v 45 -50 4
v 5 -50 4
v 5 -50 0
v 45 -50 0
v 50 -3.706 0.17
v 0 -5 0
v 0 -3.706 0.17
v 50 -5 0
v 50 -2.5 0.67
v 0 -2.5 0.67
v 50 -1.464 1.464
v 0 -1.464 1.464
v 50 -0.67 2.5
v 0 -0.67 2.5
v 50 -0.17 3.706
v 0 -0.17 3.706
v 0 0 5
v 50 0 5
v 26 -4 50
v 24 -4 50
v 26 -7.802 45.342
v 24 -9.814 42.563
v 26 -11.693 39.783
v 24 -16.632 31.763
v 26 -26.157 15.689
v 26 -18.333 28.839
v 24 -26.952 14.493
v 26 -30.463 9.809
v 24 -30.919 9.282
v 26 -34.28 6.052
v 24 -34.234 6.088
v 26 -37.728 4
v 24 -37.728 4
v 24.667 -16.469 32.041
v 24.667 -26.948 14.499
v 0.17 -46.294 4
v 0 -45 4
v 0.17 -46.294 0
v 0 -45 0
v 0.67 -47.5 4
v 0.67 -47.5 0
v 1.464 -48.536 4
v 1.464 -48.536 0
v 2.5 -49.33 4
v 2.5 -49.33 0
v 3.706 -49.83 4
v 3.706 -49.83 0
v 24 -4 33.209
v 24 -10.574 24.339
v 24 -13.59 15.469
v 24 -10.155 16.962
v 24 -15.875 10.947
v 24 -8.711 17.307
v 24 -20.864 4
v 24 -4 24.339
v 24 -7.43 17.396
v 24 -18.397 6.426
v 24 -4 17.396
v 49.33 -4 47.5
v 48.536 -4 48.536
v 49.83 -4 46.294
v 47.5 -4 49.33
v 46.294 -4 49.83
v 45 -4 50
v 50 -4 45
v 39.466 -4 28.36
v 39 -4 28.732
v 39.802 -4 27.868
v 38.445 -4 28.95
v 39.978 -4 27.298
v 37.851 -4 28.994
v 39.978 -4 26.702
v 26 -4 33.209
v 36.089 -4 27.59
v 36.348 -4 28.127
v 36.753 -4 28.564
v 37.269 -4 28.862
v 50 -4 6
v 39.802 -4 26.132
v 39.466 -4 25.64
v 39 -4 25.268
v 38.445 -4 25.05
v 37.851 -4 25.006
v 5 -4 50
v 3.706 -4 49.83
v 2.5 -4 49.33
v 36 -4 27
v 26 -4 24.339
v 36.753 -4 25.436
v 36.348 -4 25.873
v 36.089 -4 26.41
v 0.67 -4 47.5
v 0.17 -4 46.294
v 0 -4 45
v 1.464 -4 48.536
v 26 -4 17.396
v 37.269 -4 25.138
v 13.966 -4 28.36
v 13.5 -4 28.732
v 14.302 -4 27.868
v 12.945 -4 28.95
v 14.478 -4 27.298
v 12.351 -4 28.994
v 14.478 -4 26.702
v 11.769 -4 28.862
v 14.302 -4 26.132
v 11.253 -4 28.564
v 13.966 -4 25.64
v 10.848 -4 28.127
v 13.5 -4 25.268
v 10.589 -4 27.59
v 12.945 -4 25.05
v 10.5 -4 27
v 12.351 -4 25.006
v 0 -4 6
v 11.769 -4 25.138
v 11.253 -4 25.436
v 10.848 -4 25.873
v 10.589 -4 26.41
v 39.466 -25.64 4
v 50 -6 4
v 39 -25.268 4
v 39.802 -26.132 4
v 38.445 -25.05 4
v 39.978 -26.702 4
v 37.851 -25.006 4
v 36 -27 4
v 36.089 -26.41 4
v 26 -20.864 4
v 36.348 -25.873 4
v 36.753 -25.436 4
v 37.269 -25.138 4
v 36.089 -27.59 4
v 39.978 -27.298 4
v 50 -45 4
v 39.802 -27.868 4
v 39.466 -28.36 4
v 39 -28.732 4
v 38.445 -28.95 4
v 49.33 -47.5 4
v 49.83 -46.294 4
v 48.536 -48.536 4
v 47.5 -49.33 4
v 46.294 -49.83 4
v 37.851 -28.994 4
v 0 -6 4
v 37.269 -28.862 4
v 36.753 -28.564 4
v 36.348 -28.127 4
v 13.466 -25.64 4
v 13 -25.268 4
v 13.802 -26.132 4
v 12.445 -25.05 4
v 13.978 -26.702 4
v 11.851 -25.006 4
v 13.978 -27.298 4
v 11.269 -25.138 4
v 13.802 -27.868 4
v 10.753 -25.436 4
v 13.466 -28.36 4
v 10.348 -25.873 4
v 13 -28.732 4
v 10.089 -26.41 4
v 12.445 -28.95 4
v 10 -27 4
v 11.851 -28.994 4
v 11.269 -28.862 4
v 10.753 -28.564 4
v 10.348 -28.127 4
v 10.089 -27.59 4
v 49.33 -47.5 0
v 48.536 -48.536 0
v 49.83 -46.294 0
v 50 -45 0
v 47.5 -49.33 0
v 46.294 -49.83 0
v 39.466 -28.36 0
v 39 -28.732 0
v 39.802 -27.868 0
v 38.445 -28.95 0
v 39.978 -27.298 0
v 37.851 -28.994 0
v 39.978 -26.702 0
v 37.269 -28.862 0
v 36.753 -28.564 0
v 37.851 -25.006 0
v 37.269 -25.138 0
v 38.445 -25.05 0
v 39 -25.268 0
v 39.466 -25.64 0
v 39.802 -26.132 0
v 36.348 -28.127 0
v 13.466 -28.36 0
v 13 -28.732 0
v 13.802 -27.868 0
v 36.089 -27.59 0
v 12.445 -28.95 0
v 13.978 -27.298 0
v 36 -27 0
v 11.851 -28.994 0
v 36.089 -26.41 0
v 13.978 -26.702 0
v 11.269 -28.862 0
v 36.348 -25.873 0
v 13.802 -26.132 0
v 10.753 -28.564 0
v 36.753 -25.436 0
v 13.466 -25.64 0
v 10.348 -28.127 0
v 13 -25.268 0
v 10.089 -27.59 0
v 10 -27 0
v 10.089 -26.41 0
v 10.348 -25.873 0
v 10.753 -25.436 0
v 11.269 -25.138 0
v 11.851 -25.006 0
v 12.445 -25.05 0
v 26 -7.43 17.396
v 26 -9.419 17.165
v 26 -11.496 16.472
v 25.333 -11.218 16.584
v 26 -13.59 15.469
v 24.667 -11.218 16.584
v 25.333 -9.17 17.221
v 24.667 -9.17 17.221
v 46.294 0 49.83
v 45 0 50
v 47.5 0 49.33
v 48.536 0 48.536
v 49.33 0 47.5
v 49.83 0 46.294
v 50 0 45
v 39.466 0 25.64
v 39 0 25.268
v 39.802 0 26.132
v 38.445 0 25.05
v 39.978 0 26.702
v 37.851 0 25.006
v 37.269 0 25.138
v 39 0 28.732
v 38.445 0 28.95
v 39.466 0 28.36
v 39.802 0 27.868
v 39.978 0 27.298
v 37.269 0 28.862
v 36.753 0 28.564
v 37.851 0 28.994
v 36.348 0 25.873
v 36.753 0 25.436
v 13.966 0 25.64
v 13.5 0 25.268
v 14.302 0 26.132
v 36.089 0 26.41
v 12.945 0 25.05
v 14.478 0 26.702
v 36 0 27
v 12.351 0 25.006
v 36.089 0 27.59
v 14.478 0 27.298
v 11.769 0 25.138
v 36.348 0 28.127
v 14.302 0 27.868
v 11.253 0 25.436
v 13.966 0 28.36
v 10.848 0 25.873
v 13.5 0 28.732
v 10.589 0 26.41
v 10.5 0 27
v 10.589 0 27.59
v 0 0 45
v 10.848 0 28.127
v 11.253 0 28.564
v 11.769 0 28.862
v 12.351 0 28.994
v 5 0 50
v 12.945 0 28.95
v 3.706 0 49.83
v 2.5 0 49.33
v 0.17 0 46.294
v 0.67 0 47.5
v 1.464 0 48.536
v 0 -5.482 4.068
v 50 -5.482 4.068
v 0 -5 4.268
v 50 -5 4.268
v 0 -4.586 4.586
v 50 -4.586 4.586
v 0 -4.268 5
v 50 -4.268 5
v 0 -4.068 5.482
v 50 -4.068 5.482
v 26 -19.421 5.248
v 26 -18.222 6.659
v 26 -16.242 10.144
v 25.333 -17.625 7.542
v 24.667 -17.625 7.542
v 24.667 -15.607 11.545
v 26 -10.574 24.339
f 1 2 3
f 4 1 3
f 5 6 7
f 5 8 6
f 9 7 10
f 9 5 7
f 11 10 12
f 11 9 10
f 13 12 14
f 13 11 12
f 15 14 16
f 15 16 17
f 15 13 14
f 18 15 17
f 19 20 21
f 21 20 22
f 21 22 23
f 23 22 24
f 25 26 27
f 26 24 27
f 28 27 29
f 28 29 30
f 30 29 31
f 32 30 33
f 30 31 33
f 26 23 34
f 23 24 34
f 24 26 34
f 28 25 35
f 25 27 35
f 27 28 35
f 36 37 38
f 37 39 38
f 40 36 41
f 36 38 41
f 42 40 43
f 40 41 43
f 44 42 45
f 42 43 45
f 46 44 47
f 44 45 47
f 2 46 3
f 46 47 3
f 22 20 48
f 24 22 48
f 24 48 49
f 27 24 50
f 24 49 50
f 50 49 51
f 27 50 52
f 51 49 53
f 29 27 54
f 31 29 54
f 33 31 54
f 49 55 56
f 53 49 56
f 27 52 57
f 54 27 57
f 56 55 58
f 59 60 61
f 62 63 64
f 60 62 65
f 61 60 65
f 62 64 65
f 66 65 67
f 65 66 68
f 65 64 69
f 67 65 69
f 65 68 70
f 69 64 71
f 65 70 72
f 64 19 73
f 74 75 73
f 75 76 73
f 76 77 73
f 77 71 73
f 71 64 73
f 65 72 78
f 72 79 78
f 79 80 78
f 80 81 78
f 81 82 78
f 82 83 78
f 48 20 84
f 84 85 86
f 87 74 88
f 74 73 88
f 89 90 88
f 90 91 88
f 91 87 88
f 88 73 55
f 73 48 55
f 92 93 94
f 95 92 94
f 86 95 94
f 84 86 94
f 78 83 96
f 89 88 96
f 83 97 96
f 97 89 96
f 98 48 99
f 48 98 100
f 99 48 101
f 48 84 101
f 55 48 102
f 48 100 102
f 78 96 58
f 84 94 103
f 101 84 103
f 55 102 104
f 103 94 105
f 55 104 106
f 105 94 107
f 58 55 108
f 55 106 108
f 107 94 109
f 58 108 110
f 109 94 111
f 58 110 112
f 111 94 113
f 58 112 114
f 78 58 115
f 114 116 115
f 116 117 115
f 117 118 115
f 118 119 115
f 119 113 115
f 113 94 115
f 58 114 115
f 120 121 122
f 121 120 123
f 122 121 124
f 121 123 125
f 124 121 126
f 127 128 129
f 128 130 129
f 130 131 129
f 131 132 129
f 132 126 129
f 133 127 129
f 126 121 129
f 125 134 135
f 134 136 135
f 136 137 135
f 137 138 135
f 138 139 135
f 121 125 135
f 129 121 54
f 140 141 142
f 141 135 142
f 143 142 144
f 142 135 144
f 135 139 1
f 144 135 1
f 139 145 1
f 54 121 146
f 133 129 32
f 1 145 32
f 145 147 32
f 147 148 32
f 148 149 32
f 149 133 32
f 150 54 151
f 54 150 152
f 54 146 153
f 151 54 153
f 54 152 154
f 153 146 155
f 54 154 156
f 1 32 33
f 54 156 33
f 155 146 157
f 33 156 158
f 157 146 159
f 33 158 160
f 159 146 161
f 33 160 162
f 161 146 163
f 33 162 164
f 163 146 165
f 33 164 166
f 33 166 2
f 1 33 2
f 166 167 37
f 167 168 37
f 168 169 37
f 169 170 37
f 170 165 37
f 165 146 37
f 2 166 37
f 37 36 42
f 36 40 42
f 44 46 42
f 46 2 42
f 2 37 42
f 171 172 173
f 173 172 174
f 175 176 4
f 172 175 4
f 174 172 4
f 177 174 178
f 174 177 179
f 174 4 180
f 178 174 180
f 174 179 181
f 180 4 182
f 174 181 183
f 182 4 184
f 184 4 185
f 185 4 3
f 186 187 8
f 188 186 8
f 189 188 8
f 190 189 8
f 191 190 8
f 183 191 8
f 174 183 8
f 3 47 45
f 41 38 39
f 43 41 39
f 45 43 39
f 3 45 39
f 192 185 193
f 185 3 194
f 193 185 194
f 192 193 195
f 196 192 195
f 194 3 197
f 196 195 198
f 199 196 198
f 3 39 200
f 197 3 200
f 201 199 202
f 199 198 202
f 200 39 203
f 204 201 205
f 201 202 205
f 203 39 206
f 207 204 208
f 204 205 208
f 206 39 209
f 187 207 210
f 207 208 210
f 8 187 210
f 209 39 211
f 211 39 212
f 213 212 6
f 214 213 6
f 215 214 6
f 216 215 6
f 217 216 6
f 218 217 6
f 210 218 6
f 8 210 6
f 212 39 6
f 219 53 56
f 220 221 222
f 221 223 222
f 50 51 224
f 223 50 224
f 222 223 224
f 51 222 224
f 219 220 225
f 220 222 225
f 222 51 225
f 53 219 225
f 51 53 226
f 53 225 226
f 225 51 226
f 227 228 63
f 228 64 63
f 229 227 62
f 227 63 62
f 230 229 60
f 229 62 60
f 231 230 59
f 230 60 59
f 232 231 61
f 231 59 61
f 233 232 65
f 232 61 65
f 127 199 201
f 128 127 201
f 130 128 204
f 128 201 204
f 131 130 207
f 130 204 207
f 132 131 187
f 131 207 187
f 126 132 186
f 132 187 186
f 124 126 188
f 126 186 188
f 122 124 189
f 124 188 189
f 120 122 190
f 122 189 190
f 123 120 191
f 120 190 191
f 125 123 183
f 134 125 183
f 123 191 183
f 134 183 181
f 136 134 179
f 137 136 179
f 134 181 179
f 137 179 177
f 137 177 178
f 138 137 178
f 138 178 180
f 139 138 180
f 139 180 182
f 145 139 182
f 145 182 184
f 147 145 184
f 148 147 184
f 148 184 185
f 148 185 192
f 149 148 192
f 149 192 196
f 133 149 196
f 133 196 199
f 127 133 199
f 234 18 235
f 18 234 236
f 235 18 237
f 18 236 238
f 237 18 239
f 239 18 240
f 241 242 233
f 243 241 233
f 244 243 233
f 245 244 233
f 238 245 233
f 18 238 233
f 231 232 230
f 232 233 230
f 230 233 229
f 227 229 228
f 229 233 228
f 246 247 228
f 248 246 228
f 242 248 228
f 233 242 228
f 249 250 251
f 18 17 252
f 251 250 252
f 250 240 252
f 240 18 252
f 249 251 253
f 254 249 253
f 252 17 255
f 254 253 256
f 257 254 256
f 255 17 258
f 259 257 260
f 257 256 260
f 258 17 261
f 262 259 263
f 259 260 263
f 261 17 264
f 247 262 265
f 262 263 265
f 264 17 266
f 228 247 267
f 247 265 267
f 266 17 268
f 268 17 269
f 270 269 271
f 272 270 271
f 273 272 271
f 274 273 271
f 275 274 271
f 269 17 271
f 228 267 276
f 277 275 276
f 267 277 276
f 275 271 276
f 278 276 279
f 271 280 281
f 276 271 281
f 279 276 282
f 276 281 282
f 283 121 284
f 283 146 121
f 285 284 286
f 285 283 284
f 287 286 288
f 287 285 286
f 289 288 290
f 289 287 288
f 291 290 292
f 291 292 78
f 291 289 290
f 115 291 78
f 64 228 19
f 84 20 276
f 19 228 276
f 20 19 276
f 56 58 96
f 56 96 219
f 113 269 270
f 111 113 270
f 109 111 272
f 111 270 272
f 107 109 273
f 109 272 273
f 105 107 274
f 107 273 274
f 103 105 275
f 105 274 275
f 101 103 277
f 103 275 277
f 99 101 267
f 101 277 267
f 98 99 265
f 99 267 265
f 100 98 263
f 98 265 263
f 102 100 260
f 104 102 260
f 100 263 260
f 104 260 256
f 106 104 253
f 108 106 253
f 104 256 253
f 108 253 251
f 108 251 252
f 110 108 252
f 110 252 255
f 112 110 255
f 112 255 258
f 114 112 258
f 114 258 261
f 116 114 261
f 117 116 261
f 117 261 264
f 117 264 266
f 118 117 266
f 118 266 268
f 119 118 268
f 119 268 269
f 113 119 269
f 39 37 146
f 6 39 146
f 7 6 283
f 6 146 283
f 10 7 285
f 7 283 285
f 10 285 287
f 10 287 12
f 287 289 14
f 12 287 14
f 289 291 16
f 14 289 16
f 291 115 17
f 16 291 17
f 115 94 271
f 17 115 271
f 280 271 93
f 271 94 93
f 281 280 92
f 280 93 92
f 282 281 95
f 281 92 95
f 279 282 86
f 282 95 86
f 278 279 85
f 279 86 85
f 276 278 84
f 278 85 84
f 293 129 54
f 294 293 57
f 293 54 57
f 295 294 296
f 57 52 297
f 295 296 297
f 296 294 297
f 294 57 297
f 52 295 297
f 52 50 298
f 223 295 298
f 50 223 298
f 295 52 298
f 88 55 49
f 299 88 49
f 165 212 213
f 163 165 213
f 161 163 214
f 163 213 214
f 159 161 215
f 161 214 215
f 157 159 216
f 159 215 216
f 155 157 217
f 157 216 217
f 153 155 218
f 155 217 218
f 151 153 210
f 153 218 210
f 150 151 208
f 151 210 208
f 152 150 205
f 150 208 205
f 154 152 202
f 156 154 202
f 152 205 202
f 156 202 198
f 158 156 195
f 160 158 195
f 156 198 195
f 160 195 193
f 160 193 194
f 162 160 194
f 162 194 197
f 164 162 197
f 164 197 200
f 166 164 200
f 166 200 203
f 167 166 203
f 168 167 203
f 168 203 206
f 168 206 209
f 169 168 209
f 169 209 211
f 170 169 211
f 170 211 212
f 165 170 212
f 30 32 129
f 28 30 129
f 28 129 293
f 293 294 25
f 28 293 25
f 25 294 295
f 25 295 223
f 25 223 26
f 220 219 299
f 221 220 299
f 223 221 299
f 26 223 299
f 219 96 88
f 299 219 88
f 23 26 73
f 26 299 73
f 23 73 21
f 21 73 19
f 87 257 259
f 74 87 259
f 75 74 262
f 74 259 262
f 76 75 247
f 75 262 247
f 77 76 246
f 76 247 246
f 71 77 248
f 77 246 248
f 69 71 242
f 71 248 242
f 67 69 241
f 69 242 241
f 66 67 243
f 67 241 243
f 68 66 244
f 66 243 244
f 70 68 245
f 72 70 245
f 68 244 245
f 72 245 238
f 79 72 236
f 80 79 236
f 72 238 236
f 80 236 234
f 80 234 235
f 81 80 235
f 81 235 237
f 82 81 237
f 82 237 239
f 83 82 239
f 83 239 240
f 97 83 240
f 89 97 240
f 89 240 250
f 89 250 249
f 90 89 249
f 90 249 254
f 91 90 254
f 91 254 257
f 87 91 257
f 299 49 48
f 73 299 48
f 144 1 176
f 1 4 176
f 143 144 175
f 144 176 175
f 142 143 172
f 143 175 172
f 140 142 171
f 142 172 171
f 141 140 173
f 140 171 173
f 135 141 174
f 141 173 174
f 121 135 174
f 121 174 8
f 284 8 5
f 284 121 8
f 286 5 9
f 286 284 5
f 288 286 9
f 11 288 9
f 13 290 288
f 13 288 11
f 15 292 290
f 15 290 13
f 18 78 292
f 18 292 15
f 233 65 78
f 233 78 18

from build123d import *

# Parameters (mm, degrees)
F1_DEPTH         = 50
F3_DEPTH         = 46
F5_DEPTH         = 25
F7_DEPTH         = 25
F8_W             = 3.4296980606
F8_H             = 1.9268138267
F9_DEPTH         = 25
F12_D            = 4
F12_DEPTH        = 16
F12_TIP          = 1.2017212381
F12_ON_F11_D     = 4
F12_ON_F11_DEPTH = 16
F12_ON_F11_TIP   = 1.2017212381
F13_R            = 5
F14_R            = 2
F15_R            = 5


with BuildPart() as f1:
    # F0 (on Right) → F1 (new body)
    with BuildSketch(Plane.YZ):
        Polygon((-50, 4), (-50, 0), (0, 0), (0, 50), (-4, 50), (-4, 4), align=None)
    extrude(amount=F1_DEPTH)

    # F2 (on face) → F3 (join)
    with BuildSketch(Plane.XZ.offset(4)):
        Polygon((25, 50), (24, 50), (24, 4), (26, 4), (26, 50), align=None)
    extrude(amount=F3_DEPTH)

    # F4 (on face) → F5 (cut)
    with BuildSketch(Plane(origin=(24, 0, 0), x_dir=(0, -1, 0), z_dir=(-1, 0, 0))):
        with BuildLine():
            Line((50, 50), (4, 50))
            add(Edge.make_bspline(
                [(4, 50), (18.2273147409, 34.0409380861), (26.0339638541, 8.7697255613), (37.7275896233, 4)],
                knots=[0, 0, 0, 0, 0.6888068808, 0.6888068808, 0.6888068808, 0.6888068808], degree=3))
            Line((37.7275896233, 4), (49.3700235132, 4))
            Line((49.3700235132, 4), (50, 4))
            Line((50, 4), (50, 50))
        make_face()
    extrude(amount=-F5_DEPTH, mode=Mode.SUBTRACT)

    # F6 (on face) → F7 (cut)
    with BuildSketch(Plane(origin=(24, 0, 0), x_dir=(0, -1, 0), z_dir=(-1, 0, 0))):
        with BuildLine():
            Line((4, 4), (20.8637948117, 4))
            add(Edge.make_bspline(
                [(20.8637948117, 4), (16.6060887277, 7.1307057515), (16.0147414533, 11.764077872), (13.590214774, 15.4687128961)],
                knots=[0, 0, 0, 0, 13.5807342238, 13.5807342238, 13.5807342238, 13.5807342238], degree=3))
            add(Edge.make_bspline(
                [(13.590214774, 15.4687128961), (8.6228903383, 18.1297790259), (5.6070159189, 17.9523732513), (4, 15.4687128961)],
                knots=[0, 0, 0, 0, 9.590214774, 9.590214774, 9.590214774, 9.590214774], degree=3))
            Line((4, 15.4687128961), (4, 4))
        make_face()
        Polygon((4, 33.209156245), (4, 24.3389345706), (10.5743389577, 24.3389345706), align=None)
    extrude(amount=-F7_DEPTH, mode=Mode.SUBTRACT)

    # F8 (on face) → F9 (cut)
    with BuildSketch(Plane(origin=(24, 0, 0), x_dir=(0, -1, 0), z_dir=(-1, 0, 0))):
        with Locations((5.7148490303, 16.4321198095)):
            Rectangle(F8_W, F8_H)
    extrude(amount=-F9_DEPTH, mode=Mode.SUBTRACT)

    # F12
    with Locations(Plane.XZ.offset(4)):
        with Locations((12.5, 27), (38, 27)):
            Hole(F12_D / 2, depth=F12_DEPTH)
            with Locations((0, 0, -(F12_DEPTH + F12_TIP / 2))):  # 118° drill point
                Cone(0, F12_D / 2, F12_TIP, mode=Mode.SUBTRACT)

    # F12 on F11
    with Locations(Plane.XY.offset(4)):
        with Locations((38, -27), (12, -27)):
            Hole(F12_ON_F11_D / 2, depth=F12_ON_F11_DEPTH)
            with Locations((0, 0, -(F12_ON_F11_DEPTH + F12_ON_F11_TIP / 2))):  # 118° drill point
                Cone(0, F12_ON_F11_D / 2, F12_ON_F11_TIP, mode=Mode.SUBTRACT)

    # F13
    f13_edges = [f1.edges().sort_by_distance(p)[0] for p in [
        (25, 0, 0),
    ]]
    fillet(f13_edges, radius=F13_R)

    # F14
    f14_edges = [f1.edges().sort_by_distance(p)[0] for p in [
        (25, -4, 4),
    ]]
    fillet(f14_edges, radius=F14_R)

    # F15
    f15_edges = [f1.edges().sort_by_distance(p)[0] for p in [
        (0, -2, 50),
        (50, -2, 50),
        (0, -50, 2),
        (50, -50, 2),
    ]]
    fillet(f15_edges, radius=F15_R)


solid = f1.part
